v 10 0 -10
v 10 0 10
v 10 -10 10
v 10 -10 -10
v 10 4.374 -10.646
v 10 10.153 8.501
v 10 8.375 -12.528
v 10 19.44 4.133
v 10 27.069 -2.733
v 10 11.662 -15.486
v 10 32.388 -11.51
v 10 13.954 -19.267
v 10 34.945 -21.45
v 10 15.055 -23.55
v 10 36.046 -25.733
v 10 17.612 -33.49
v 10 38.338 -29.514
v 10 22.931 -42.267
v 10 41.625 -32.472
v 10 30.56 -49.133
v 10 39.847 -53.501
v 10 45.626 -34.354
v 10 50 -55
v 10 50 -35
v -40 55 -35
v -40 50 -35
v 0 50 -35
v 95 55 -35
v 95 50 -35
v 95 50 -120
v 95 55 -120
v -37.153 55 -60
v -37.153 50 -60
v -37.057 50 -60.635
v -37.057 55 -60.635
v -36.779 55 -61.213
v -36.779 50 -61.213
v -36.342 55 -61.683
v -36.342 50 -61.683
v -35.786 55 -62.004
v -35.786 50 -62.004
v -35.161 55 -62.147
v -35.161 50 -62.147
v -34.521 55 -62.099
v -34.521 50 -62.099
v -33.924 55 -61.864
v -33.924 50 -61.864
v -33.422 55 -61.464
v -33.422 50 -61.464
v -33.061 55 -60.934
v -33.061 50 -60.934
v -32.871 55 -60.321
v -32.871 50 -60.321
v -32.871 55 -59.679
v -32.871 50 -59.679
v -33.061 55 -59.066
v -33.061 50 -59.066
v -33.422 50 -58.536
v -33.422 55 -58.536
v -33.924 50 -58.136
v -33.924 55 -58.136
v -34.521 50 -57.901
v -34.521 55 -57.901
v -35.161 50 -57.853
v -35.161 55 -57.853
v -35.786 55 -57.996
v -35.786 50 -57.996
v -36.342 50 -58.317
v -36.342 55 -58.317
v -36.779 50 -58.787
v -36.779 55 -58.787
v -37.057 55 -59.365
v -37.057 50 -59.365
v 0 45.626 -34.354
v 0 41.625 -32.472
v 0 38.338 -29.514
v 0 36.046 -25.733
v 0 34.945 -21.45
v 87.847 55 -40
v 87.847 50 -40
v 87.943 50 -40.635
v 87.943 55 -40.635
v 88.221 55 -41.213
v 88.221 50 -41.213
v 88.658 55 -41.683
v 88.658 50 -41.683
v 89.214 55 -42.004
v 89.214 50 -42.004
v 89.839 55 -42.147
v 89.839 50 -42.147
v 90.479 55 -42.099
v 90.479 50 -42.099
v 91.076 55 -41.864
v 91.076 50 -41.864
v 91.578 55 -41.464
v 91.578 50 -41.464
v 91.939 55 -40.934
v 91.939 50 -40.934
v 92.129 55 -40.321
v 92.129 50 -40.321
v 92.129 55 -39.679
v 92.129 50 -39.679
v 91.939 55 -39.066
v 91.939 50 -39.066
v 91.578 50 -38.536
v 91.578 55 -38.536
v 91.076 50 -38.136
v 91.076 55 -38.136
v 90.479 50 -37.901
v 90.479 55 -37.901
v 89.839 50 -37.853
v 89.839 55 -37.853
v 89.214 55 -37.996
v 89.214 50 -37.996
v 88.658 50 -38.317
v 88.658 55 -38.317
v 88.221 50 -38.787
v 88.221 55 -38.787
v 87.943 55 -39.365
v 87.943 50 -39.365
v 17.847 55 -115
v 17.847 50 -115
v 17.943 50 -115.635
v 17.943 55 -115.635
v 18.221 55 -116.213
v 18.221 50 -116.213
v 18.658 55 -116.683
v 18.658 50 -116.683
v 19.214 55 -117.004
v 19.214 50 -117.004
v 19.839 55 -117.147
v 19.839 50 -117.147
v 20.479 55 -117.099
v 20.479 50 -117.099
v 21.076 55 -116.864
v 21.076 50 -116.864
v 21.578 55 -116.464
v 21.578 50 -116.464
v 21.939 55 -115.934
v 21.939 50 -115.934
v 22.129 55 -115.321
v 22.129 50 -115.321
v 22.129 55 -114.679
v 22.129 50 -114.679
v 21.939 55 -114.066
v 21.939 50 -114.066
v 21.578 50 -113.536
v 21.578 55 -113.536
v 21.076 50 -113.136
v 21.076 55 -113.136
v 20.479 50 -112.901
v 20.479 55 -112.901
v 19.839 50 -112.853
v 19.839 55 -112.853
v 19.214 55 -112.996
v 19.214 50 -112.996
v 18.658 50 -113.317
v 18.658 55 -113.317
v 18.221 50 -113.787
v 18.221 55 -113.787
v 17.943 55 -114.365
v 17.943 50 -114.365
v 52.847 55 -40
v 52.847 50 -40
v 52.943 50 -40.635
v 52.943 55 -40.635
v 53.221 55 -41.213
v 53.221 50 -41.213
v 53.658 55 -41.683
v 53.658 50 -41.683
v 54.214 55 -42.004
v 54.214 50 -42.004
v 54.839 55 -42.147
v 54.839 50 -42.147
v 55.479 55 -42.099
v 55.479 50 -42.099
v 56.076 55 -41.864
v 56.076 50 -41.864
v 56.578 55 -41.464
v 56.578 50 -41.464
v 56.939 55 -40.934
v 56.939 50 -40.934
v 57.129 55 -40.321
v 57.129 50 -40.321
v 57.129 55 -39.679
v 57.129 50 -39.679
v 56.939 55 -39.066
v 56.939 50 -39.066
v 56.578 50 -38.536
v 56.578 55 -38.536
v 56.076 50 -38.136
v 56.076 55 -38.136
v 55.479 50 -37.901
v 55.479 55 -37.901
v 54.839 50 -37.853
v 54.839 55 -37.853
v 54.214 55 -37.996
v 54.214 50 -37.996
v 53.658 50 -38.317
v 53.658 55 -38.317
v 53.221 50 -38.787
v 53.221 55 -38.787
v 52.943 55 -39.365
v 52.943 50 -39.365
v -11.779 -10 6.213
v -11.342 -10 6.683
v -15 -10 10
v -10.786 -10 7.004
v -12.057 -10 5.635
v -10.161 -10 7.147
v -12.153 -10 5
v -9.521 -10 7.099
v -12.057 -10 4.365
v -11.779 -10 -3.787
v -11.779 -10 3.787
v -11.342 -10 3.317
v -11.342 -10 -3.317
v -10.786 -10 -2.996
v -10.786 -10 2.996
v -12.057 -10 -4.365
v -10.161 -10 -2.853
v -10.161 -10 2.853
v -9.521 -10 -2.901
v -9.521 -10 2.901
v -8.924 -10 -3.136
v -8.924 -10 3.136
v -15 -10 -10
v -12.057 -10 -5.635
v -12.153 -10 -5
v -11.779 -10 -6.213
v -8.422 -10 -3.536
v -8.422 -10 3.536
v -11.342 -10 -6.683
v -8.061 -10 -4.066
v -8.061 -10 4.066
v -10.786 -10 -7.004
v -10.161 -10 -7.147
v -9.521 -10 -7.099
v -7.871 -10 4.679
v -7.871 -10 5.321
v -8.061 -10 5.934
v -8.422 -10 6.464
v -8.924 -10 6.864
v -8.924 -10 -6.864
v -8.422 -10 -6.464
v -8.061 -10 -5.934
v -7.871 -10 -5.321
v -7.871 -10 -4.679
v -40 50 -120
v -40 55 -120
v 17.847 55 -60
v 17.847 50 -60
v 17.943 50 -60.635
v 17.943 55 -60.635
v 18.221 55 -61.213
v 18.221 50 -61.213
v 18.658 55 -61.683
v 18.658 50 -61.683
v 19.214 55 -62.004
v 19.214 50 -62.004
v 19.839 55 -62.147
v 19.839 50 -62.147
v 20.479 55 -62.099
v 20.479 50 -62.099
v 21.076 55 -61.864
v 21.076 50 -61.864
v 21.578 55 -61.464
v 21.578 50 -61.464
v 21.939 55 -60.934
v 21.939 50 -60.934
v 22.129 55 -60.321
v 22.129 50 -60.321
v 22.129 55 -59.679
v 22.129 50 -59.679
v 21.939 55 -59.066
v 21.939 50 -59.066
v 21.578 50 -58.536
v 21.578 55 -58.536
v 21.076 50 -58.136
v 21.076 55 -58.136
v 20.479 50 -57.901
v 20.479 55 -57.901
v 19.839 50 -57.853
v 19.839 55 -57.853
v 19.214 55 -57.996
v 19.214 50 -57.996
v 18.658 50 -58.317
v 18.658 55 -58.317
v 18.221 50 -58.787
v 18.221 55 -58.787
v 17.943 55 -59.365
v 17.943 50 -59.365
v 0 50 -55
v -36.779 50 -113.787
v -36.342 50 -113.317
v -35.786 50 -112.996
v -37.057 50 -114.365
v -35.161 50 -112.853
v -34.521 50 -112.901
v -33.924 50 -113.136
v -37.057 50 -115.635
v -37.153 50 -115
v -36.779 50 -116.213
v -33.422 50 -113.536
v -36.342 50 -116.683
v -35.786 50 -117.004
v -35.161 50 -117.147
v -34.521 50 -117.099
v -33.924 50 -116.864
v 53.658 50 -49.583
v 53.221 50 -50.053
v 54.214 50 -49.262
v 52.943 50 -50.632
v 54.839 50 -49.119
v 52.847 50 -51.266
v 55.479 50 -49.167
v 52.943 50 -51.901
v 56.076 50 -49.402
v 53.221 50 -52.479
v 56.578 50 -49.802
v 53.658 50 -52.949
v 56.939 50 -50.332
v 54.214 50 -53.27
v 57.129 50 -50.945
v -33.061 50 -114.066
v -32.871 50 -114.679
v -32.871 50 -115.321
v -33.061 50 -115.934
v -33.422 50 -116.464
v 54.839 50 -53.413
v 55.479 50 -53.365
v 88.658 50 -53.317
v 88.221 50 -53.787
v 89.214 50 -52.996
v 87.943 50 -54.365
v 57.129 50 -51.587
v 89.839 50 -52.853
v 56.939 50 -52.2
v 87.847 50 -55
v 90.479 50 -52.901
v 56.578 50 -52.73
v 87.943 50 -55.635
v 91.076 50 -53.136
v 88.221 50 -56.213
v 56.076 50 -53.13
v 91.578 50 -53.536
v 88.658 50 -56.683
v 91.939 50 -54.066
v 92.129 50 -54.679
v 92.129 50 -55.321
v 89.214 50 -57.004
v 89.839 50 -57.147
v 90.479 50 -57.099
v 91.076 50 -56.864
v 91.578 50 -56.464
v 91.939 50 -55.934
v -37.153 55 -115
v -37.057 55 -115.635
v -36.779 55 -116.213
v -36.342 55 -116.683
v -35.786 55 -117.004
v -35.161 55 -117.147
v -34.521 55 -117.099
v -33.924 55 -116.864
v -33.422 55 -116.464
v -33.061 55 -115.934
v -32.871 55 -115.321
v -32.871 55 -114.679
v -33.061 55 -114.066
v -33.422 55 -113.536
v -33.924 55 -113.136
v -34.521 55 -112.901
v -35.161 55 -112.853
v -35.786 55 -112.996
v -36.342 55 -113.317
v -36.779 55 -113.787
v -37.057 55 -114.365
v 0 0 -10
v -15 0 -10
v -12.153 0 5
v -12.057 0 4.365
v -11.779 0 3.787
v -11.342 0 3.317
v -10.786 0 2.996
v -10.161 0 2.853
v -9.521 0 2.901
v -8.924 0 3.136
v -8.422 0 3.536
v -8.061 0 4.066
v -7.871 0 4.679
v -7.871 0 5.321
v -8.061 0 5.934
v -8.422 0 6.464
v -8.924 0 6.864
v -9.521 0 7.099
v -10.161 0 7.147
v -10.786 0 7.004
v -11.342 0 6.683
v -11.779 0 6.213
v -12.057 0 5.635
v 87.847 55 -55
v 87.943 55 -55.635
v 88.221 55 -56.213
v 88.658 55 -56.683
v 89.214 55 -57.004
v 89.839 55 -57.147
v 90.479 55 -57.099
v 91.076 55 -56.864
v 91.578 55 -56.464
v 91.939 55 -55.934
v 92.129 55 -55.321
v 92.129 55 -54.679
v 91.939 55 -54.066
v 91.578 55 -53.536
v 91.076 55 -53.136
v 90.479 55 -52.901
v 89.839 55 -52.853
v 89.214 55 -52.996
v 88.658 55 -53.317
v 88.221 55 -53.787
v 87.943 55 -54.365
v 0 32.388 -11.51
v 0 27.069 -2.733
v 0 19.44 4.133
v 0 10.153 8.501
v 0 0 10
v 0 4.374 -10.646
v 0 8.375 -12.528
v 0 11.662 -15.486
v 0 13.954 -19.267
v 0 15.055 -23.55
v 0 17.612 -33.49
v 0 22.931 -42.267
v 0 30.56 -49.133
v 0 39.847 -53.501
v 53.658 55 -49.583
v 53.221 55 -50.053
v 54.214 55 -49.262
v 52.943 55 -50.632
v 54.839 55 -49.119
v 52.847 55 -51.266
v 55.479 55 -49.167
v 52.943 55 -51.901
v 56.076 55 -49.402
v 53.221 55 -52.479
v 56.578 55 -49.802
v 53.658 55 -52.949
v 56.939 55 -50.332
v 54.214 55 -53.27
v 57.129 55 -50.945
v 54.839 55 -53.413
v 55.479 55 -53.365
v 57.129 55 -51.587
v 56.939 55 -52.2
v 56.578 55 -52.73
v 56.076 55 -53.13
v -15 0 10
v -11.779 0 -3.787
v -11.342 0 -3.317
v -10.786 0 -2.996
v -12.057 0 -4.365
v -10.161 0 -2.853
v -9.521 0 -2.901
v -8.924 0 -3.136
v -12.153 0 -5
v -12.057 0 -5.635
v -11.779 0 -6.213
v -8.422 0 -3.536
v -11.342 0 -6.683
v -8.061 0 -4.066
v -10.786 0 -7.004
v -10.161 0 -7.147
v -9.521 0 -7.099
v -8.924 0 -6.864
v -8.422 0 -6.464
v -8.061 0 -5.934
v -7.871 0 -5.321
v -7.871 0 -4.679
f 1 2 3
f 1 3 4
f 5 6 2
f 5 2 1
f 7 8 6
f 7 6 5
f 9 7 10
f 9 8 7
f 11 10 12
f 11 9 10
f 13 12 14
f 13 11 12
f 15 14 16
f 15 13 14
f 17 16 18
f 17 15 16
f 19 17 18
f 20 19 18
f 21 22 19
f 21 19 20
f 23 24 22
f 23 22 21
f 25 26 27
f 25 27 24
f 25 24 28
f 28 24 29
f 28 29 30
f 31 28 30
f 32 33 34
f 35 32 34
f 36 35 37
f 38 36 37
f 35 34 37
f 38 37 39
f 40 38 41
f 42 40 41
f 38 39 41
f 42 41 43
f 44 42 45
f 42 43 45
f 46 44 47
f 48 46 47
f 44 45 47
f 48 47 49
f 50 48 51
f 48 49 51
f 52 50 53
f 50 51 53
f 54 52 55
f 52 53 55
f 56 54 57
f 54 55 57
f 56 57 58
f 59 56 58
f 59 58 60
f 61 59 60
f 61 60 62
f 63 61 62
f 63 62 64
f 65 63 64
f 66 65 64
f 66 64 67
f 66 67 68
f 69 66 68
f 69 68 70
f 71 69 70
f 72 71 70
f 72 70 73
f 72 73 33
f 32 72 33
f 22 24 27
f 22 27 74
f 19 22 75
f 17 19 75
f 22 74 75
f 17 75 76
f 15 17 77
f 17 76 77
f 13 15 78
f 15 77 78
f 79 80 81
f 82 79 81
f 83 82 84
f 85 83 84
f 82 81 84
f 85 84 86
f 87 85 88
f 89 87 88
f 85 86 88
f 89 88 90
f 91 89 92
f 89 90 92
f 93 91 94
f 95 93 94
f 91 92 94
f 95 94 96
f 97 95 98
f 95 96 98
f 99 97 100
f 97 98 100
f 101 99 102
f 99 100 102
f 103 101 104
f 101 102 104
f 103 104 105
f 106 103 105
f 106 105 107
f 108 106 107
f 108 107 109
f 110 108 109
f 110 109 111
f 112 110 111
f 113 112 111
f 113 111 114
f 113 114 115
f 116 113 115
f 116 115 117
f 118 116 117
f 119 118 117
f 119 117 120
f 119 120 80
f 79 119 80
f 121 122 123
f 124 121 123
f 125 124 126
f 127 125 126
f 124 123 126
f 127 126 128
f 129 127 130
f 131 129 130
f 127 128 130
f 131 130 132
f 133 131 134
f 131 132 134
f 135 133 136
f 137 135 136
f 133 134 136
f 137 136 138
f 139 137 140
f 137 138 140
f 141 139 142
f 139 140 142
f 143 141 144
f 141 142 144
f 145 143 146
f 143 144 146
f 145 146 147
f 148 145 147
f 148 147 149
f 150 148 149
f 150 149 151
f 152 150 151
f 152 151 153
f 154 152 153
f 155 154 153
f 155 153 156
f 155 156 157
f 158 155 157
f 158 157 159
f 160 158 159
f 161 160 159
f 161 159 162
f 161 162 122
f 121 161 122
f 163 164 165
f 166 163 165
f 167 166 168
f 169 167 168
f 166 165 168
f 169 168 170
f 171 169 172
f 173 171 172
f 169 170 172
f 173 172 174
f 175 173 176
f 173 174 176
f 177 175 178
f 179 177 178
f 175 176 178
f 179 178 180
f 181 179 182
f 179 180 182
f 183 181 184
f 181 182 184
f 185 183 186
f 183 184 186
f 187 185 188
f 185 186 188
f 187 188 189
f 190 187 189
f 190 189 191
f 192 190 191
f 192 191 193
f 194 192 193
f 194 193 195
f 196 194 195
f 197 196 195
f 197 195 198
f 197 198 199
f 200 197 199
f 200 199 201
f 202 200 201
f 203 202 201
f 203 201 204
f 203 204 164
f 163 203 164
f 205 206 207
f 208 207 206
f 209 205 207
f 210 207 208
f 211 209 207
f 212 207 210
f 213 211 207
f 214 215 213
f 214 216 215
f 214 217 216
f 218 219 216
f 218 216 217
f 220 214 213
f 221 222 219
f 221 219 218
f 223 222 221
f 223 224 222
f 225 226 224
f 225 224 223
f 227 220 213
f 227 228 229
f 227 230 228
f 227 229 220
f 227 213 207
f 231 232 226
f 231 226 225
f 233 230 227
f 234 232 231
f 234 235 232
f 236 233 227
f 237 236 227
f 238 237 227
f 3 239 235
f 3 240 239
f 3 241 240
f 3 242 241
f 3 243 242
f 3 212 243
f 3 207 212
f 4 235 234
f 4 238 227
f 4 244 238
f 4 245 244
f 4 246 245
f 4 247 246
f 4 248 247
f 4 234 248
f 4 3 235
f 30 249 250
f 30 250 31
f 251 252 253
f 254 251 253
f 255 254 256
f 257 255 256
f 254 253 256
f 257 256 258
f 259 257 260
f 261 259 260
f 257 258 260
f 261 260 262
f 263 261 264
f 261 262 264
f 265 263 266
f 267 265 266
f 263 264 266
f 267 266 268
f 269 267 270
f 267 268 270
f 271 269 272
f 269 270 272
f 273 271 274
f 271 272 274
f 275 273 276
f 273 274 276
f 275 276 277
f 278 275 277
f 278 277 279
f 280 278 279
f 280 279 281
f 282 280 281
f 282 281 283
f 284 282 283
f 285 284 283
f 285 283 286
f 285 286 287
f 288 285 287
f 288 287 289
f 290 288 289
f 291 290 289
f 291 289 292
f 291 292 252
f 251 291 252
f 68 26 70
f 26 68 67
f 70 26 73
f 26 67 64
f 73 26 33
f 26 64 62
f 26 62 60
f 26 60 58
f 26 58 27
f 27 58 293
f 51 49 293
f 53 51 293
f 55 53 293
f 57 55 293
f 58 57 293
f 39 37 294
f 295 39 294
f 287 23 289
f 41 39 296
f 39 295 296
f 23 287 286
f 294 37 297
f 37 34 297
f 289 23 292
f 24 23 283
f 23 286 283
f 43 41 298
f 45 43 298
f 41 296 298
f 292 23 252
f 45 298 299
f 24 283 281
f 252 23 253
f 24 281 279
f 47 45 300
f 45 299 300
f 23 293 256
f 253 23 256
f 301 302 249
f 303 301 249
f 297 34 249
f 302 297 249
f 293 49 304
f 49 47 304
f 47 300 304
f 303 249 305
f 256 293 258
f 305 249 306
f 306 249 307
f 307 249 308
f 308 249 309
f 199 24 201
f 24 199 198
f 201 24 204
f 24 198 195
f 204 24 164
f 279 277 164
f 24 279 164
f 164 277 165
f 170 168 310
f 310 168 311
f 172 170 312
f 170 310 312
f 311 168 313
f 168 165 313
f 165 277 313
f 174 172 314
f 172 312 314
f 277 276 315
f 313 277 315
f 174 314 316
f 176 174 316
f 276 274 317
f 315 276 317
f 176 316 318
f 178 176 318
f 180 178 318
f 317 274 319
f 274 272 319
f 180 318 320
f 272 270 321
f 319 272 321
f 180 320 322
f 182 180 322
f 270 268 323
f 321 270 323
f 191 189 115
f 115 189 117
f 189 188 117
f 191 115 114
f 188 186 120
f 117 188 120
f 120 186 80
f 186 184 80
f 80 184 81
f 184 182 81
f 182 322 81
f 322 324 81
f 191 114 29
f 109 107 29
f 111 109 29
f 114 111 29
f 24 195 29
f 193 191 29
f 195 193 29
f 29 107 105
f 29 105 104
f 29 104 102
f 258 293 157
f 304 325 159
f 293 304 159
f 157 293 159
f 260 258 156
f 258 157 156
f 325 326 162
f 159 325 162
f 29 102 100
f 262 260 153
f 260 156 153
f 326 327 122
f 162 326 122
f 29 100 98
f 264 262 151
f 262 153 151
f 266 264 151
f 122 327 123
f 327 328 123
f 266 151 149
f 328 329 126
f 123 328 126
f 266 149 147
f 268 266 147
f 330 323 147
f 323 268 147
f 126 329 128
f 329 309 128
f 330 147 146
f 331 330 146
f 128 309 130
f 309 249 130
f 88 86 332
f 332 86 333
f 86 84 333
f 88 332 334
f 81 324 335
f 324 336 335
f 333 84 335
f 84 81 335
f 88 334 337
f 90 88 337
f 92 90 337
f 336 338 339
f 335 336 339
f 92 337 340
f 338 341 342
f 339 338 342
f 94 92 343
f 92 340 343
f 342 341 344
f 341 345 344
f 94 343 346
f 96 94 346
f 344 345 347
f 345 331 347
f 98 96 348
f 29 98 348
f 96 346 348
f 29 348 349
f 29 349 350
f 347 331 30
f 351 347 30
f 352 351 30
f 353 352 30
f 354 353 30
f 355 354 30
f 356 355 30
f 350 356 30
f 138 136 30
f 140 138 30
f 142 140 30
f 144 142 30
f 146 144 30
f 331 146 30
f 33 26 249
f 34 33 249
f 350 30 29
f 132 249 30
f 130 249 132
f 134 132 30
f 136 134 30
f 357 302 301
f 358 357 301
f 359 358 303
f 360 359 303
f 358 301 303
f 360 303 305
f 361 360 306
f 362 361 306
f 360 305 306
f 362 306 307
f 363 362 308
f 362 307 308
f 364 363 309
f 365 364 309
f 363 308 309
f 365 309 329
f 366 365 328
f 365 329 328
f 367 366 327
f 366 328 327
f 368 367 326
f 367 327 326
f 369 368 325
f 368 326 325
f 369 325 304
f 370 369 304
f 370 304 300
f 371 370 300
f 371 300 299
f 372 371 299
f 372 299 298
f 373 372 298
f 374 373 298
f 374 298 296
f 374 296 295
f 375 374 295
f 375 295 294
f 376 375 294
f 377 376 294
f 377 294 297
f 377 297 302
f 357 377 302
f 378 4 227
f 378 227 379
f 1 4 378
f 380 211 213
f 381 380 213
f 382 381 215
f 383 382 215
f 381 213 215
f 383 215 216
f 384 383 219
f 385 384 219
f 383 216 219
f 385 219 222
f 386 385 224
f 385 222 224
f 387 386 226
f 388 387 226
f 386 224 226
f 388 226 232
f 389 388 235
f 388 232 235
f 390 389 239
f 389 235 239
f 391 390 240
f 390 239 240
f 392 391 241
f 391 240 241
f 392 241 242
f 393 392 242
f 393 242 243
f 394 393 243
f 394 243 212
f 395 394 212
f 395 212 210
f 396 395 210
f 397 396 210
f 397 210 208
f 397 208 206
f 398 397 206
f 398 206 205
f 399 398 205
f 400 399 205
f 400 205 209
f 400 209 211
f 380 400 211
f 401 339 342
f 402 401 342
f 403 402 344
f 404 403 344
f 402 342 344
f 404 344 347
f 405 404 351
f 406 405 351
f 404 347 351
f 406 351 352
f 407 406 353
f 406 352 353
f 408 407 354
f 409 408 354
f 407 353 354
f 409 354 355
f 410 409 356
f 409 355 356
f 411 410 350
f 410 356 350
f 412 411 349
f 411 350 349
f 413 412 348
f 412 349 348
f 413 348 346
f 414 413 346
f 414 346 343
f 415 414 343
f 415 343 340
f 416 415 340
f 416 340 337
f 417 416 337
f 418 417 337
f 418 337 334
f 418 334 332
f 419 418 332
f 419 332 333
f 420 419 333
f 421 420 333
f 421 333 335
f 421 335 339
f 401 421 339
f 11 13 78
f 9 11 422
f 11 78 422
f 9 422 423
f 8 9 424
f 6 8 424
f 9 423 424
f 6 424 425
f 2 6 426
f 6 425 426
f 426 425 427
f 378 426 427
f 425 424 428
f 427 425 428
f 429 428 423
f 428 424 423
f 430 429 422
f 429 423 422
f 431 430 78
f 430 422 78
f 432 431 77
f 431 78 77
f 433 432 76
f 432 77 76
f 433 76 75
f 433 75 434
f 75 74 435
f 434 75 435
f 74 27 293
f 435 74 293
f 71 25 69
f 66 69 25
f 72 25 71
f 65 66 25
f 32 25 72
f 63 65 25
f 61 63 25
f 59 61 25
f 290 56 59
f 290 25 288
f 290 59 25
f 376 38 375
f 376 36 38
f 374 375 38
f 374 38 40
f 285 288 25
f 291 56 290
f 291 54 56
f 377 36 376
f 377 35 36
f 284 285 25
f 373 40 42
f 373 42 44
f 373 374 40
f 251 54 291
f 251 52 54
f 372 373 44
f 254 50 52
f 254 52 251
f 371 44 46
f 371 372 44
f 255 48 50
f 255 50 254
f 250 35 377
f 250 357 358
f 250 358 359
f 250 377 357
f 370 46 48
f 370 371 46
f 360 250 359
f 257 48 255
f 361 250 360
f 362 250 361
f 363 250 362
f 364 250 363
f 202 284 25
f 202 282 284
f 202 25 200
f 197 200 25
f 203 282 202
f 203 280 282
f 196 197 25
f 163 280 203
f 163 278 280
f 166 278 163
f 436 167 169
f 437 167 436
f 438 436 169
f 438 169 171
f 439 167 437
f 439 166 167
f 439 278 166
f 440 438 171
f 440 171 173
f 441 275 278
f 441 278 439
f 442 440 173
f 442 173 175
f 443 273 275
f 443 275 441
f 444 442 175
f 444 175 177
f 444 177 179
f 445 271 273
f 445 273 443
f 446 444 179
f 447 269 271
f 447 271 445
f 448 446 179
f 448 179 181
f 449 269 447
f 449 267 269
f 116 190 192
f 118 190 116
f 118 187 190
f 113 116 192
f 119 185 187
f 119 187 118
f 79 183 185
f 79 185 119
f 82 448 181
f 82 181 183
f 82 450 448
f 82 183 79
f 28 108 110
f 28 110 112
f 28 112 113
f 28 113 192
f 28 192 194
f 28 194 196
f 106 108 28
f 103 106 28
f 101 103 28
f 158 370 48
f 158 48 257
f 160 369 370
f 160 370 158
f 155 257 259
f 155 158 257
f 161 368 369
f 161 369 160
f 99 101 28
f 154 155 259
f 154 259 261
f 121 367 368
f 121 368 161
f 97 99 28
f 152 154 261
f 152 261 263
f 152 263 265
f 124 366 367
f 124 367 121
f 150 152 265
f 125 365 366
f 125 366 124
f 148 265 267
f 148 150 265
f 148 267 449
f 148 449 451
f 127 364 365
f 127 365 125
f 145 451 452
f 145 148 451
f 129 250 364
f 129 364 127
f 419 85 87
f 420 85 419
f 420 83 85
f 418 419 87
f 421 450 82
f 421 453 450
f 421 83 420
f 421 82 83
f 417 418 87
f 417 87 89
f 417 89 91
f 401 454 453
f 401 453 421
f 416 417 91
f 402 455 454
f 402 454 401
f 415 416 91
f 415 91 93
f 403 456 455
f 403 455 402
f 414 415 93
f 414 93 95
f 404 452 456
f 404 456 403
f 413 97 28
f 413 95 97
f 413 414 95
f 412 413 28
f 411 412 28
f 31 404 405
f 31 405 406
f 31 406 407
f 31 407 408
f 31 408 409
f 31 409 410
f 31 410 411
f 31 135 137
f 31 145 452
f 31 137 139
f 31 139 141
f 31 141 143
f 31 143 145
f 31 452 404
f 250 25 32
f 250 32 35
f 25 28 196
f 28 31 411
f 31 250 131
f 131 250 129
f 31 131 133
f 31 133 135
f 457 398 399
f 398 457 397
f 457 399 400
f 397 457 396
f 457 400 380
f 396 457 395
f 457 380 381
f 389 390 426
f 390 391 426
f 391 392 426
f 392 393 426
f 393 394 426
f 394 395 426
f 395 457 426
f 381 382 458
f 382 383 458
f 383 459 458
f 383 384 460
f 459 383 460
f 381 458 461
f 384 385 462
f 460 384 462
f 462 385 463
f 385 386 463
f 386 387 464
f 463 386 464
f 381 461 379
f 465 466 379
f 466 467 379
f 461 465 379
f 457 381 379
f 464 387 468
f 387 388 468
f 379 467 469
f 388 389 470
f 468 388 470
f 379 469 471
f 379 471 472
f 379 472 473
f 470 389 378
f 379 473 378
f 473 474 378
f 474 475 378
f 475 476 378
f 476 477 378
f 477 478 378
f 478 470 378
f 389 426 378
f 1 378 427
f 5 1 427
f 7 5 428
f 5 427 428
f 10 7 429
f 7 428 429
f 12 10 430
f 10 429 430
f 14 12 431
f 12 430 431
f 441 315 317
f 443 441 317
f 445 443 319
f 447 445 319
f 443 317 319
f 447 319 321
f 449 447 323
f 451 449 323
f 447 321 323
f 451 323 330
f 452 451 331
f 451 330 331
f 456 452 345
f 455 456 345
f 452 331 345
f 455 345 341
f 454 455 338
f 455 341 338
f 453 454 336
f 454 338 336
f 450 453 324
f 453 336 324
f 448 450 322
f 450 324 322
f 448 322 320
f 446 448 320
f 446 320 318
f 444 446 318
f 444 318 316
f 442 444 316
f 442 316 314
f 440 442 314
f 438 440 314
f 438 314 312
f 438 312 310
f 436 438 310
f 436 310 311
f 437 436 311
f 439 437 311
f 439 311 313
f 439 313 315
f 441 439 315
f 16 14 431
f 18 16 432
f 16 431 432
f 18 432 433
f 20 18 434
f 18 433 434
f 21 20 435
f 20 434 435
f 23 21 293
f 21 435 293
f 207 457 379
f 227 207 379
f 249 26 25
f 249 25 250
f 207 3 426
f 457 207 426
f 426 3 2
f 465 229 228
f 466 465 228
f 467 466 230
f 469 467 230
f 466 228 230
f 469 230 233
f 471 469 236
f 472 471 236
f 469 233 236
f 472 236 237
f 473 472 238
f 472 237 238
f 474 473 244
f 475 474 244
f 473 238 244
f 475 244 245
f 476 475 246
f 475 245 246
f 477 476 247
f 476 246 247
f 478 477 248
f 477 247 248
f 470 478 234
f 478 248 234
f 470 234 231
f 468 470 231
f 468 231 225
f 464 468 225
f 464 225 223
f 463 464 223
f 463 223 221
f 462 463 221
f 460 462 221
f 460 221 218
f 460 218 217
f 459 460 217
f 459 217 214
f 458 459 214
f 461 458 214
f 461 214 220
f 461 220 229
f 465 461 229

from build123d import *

# Parameters (mm, degrees)
BOSS_EXTRUDE1_DEPTH   = 10
SKETCH2_W             = 20
SKETCH2_H             = 10
BOSS_EXTRUDE2_DEPTH   = 25
F_6_CLEARANCE_HOLE1_D = 4.3053
SKETCH5_W             = 135
SKETCH5_H             = 85
BOSS_EXTRUDE3_DEPTH   = 5
F_6_CLEARANCE_HOLE2_D = 4.3053
F_6_CLEARANCE_HOLE3_D = 4.3053


with BuildPart() as part:
    # Sketch1 → Boss-Extrude1 (new body)
    with BuildSketch(Plane(origin=(0, 0, 0), x_dir=(0, 0, -1), z_dir=(1, 0, 0))):
        with BuildLine():
            Line((-10, 0), (-10, -10))
            Line((-10, -10), (10, -10))
            Line((10, -10), (10, 0))
            ThreePointArc((10, 0), (13.886241397, 10.127382743), (23.549723757, 15.055248619))
            ThreePointArc((23.549723757, 15.055248619), (45.979641528, 26.493322625), (55, 50))
            Line((55, 50), (35, 50))
            ThreePointArc((35, 50), (31.113758603, 39.872617257), (21.450276243, 34.944751381))
            ThreePointArc((21.450276243, 34.944751381), (-0.979641528, 23.506677375), (-10, 0))
        make_face()
    extrude(amount=BOSS_EXTRUDE1_DEPTH)

    # Sketch2 → Boss-Extrude2 (add)
    with BuildSketch(Plane(origin=(10, 0, 0), x_dir=(0, 0, -1), z_dir=(1, 0, 0))):
        with Locations((0, -5)):
            Rectangle(SKETCH2_W, SKETCH2_H)
    extrude(amount=-BOSS_EXTRUDE2_DEPTH)

    # #6 Clearance Hole1 (through all)
    with Locations(Plane(origin=(0, 0, 0), x_dir=(1, 0, 0), z_dir=(0, 1, 0))):
        with Locations((-10, 5), (-10, -5)):
            Hole(F_6_CLEARANCE_HOLE1_D / 2)

    # Sketch5 → Boss-Extrude3 (add)
    with BuildSketch(Plane(origin=(0, 50, 0), x_dir=(1, 0, 0), z_dir=(0, 1, 0))):
        with Locations((27.5, 77.5)):
            Rectangle(SKETCH5_W, SKETCH5_H)
    extrude(amount=BOSS_EXTRUDE3_DEPTH)

    # #6 Clearance Hole2 (through all)
    with Locations(Plane(origin=(0, 55, 0), x_dir=(1, 0, 0), z_dir=(0, 1, 0))):
        with Locations((20, 115), (20, 60), (-35, 60), (-35, 115)):
            Hole(F_6_CLEARANCE_HOLE2_D / 2)

    # #6 Clearance Hole3 (through all)
    with Locations(Plane(origin=(0, 55, 0), x_dir=(1, 0, 0), z_dir=(0, 1, 0))):
        with Locations((90, 40), (55, 40), (55, 51.266063414), (90, 55)):
            Hole(F_6_CLEARANCE_HOLE3_D / 2)


solid = part.part
